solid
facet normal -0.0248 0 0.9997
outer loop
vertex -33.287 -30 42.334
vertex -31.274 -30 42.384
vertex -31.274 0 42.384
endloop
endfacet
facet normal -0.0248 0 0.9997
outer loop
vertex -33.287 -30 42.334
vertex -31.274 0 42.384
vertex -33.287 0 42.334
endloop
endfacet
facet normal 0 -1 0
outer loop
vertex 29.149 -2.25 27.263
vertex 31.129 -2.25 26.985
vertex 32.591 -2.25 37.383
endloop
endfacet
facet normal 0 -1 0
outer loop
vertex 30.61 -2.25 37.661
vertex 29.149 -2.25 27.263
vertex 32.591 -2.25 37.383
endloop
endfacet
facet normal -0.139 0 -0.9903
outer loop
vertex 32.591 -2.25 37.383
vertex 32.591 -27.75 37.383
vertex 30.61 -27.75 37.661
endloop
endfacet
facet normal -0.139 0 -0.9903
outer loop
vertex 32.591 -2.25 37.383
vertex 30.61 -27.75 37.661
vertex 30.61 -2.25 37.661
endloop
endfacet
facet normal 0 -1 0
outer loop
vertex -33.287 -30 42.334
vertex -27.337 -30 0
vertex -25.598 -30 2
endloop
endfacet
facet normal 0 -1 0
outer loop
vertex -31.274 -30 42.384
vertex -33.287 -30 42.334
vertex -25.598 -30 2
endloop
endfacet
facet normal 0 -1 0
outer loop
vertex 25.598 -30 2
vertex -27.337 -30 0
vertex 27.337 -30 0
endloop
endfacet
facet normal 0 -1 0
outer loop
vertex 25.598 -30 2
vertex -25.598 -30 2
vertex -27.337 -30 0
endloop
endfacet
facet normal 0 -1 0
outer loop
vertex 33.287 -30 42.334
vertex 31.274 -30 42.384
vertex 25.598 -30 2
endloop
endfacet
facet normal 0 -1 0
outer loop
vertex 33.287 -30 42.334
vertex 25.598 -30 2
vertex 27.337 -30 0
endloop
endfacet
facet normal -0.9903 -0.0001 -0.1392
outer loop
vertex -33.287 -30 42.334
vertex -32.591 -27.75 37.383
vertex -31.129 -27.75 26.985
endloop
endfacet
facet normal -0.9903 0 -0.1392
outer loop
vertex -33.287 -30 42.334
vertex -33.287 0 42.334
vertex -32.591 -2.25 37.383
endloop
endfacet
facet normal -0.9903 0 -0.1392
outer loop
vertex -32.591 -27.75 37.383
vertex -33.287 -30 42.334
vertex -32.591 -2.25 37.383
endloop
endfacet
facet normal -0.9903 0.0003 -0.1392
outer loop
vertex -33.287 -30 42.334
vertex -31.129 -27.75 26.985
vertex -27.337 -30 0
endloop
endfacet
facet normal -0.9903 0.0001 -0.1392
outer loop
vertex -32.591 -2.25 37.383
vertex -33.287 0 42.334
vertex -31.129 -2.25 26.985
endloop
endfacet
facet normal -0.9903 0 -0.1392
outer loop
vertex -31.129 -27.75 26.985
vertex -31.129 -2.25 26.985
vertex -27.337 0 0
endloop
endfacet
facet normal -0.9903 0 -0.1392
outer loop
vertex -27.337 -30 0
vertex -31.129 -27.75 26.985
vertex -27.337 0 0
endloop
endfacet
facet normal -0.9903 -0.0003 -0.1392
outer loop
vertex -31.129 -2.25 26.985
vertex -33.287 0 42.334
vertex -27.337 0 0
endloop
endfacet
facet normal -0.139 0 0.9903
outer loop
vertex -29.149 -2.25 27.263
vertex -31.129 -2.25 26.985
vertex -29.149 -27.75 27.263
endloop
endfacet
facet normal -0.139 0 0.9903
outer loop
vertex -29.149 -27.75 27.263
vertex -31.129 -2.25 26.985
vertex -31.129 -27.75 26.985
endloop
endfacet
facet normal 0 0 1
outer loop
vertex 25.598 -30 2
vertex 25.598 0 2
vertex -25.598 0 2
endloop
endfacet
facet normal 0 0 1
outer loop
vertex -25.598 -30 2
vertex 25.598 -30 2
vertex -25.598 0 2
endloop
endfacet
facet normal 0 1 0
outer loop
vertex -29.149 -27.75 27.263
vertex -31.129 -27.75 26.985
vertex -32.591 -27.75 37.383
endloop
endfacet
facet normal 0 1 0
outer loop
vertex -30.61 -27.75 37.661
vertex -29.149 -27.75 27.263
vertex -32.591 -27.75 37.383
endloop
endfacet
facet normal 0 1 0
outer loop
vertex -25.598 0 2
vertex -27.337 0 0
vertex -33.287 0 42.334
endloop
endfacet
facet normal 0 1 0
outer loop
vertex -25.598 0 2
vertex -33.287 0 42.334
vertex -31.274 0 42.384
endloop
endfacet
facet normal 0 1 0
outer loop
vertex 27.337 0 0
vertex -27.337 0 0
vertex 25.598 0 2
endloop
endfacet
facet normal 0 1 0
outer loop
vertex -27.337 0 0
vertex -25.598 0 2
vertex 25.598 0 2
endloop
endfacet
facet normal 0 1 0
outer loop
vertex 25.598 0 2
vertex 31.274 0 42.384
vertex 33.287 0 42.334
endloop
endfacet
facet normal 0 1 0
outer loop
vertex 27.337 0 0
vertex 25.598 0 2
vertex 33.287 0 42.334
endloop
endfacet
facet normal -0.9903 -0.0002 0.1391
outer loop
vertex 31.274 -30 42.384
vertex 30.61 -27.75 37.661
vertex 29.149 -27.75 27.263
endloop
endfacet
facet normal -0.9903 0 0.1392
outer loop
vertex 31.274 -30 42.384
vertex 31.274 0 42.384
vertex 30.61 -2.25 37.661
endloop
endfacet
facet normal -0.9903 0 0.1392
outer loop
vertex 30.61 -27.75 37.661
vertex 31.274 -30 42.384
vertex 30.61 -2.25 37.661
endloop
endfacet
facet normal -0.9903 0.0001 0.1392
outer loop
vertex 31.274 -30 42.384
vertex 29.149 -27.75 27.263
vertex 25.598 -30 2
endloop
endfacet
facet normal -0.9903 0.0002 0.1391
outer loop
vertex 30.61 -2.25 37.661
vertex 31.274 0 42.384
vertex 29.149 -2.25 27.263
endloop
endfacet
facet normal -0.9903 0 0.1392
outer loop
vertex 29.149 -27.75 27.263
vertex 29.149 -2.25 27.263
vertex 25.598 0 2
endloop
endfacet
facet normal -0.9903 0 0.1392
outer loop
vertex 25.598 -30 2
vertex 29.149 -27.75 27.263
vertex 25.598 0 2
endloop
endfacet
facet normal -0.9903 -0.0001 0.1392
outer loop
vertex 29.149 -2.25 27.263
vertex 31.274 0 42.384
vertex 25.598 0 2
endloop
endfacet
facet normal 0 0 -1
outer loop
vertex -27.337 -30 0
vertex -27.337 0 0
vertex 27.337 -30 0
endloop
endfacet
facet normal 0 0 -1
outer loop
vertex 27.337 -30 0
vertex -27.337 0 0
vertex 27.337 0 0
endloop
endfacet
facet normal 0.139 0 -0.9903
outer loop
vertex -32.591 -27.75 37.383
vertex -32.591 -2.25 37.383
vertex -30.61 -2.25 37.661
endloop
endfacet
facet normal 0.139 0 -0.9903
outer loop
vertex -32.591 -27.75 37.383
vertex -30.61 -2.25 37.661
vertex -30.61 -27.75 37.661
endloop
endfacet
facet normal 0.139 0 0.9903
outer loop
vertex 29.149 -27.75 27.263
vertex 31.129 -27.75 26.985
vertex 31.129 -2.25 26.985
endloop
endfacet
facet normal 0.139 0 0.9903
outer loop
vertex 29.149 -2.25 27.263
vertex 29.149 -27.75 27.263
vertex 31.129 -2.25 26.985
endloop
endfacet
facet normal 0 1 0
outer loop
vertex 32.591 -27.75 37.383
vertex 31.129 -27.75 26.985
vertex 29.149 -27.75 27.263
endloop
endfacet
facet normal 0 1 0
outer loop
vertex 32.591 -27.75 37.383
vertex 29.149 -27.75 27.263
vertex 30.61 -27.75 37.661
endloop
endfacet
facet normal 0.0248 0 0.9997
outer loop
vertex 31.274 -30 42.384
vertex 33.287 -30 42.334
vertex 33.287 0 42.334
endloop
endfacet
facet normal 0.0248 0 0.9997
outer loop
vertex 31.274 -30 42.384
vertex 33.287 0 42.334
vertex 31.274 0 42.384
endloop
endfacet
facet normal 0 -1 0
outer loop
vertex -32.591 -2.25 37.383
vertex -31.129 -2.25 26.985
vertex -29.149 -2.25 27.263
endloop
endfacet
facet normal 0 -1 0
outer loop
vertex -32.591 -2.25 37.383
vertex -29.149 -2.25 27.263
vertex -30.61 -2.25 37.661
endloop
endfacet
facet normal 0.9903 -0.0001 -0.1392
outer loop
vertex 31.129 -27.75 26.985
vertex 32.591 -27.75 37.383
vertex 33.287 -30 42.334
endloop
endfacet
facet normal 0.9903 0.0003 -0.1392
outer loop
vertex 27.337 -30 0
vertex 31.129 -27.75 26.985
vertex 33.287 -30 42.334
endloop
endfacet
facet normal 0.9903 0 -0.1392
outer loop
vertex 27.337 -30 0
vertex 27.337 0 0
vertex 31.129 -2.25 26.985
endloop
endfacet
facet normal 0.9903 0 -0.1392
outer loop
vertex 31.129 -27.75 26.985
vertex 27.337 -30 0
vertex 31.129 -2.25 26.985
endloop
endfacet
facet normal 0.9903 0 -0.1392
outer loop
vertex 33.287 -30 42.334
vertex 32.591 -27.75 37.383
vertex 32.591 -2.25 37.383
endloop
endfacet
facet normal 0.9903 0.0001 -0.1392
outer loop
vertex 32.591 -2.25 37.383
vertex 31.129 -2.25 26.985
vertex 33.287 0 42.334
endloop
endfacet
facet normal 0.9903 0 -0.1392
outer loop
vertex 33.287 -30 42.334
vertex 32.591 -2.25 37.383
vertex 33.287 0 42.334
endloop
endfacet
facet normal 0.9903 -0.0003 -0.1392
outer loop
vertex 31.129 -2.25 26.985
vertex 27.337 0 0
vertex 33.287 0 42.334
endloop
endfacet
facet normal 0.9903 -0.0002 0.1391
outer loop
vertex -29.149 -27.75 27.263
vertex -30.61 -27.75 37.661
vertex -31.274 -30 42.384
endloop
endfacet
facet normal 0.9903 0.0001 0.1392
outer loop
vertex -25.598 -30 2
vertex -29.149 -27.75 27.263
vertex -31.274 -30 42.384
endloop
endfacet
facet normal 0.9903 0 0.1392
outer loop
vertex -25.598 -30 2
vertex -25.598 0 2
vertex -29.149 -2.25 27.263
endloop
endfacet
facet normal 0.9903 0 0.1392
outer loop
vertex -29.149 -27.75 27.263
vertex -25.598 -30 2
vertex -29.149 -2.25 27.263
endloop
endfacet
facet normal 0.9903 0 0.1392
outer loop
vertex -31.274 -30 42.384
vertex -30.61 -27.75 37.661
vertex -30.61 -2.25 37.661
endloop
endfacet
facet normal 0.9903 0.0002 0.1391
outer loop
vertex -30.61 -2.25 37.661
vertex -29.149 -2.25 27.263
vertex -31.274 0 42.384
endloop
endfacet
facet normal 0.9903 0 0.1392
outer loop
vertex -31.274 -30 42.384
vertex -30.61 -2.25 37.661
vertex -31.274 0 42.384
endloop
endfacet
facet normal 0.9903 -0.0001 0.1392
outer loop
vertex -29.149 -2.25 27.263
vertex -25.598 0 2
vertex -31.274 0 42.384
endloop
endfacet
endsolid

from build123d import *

# Parameters (mm, degrees)
F1_DEPTH = 30
F2_W     = 25.5
F2_H     = 10.5
F3_DEPTH = 5
F4_W     = 25.5
F4_H     = 10.5
F5_DEPTH = 5


with BuildPart() as f1:
    # F0 (on Front) → F1 (new body)
    with BuildSketch(Plane.XZ):
        Polygon((0.0016284716, 2), (-0.0016284716, 2), (-25.5983715284, 2), (-31.2740161038, 42.3843095671), (-33.2866138074, 42.3340932619), (-27.336945004, 0), (0, 0), (27.336945004, 0), (33.2866138074, 42.3340932619), (31.2740161038, 42.3843095671), (25.5983715284, 2), align=None)
    extrude(amount=F1_DEPTH)

    # F2 (on face) → F3 (cut)
    with BuildSketch(Plane(origin=(26.8074515602, 0, -3.7675416185), x_dir=(0, 1, 0), z_dir=(0.9902680687, 0, -0.139173101))):
        with Locations((-15, 36.3047020404)):
            Rectangle(F2_W, F2_H)
    extrude(amount=-F3_DEPTH, mode=Mode.SUBTRACT)

    # F4 (on face) → F5 (cut)
    with BuildSketch(Plane(origin=(-26.8074515602, 0, -3.7675416185), x_dir=(0, -1, 0), z_dir=(-0.9902680687, 0, -0.139173101))):
        with Locations((15, 36.3047020404)):
            Rectangle(F4_W, F4_H)
    extrude(amount=-F5_DEPTH, mode=Mode.SUBTRACT)


solid = f1.part
